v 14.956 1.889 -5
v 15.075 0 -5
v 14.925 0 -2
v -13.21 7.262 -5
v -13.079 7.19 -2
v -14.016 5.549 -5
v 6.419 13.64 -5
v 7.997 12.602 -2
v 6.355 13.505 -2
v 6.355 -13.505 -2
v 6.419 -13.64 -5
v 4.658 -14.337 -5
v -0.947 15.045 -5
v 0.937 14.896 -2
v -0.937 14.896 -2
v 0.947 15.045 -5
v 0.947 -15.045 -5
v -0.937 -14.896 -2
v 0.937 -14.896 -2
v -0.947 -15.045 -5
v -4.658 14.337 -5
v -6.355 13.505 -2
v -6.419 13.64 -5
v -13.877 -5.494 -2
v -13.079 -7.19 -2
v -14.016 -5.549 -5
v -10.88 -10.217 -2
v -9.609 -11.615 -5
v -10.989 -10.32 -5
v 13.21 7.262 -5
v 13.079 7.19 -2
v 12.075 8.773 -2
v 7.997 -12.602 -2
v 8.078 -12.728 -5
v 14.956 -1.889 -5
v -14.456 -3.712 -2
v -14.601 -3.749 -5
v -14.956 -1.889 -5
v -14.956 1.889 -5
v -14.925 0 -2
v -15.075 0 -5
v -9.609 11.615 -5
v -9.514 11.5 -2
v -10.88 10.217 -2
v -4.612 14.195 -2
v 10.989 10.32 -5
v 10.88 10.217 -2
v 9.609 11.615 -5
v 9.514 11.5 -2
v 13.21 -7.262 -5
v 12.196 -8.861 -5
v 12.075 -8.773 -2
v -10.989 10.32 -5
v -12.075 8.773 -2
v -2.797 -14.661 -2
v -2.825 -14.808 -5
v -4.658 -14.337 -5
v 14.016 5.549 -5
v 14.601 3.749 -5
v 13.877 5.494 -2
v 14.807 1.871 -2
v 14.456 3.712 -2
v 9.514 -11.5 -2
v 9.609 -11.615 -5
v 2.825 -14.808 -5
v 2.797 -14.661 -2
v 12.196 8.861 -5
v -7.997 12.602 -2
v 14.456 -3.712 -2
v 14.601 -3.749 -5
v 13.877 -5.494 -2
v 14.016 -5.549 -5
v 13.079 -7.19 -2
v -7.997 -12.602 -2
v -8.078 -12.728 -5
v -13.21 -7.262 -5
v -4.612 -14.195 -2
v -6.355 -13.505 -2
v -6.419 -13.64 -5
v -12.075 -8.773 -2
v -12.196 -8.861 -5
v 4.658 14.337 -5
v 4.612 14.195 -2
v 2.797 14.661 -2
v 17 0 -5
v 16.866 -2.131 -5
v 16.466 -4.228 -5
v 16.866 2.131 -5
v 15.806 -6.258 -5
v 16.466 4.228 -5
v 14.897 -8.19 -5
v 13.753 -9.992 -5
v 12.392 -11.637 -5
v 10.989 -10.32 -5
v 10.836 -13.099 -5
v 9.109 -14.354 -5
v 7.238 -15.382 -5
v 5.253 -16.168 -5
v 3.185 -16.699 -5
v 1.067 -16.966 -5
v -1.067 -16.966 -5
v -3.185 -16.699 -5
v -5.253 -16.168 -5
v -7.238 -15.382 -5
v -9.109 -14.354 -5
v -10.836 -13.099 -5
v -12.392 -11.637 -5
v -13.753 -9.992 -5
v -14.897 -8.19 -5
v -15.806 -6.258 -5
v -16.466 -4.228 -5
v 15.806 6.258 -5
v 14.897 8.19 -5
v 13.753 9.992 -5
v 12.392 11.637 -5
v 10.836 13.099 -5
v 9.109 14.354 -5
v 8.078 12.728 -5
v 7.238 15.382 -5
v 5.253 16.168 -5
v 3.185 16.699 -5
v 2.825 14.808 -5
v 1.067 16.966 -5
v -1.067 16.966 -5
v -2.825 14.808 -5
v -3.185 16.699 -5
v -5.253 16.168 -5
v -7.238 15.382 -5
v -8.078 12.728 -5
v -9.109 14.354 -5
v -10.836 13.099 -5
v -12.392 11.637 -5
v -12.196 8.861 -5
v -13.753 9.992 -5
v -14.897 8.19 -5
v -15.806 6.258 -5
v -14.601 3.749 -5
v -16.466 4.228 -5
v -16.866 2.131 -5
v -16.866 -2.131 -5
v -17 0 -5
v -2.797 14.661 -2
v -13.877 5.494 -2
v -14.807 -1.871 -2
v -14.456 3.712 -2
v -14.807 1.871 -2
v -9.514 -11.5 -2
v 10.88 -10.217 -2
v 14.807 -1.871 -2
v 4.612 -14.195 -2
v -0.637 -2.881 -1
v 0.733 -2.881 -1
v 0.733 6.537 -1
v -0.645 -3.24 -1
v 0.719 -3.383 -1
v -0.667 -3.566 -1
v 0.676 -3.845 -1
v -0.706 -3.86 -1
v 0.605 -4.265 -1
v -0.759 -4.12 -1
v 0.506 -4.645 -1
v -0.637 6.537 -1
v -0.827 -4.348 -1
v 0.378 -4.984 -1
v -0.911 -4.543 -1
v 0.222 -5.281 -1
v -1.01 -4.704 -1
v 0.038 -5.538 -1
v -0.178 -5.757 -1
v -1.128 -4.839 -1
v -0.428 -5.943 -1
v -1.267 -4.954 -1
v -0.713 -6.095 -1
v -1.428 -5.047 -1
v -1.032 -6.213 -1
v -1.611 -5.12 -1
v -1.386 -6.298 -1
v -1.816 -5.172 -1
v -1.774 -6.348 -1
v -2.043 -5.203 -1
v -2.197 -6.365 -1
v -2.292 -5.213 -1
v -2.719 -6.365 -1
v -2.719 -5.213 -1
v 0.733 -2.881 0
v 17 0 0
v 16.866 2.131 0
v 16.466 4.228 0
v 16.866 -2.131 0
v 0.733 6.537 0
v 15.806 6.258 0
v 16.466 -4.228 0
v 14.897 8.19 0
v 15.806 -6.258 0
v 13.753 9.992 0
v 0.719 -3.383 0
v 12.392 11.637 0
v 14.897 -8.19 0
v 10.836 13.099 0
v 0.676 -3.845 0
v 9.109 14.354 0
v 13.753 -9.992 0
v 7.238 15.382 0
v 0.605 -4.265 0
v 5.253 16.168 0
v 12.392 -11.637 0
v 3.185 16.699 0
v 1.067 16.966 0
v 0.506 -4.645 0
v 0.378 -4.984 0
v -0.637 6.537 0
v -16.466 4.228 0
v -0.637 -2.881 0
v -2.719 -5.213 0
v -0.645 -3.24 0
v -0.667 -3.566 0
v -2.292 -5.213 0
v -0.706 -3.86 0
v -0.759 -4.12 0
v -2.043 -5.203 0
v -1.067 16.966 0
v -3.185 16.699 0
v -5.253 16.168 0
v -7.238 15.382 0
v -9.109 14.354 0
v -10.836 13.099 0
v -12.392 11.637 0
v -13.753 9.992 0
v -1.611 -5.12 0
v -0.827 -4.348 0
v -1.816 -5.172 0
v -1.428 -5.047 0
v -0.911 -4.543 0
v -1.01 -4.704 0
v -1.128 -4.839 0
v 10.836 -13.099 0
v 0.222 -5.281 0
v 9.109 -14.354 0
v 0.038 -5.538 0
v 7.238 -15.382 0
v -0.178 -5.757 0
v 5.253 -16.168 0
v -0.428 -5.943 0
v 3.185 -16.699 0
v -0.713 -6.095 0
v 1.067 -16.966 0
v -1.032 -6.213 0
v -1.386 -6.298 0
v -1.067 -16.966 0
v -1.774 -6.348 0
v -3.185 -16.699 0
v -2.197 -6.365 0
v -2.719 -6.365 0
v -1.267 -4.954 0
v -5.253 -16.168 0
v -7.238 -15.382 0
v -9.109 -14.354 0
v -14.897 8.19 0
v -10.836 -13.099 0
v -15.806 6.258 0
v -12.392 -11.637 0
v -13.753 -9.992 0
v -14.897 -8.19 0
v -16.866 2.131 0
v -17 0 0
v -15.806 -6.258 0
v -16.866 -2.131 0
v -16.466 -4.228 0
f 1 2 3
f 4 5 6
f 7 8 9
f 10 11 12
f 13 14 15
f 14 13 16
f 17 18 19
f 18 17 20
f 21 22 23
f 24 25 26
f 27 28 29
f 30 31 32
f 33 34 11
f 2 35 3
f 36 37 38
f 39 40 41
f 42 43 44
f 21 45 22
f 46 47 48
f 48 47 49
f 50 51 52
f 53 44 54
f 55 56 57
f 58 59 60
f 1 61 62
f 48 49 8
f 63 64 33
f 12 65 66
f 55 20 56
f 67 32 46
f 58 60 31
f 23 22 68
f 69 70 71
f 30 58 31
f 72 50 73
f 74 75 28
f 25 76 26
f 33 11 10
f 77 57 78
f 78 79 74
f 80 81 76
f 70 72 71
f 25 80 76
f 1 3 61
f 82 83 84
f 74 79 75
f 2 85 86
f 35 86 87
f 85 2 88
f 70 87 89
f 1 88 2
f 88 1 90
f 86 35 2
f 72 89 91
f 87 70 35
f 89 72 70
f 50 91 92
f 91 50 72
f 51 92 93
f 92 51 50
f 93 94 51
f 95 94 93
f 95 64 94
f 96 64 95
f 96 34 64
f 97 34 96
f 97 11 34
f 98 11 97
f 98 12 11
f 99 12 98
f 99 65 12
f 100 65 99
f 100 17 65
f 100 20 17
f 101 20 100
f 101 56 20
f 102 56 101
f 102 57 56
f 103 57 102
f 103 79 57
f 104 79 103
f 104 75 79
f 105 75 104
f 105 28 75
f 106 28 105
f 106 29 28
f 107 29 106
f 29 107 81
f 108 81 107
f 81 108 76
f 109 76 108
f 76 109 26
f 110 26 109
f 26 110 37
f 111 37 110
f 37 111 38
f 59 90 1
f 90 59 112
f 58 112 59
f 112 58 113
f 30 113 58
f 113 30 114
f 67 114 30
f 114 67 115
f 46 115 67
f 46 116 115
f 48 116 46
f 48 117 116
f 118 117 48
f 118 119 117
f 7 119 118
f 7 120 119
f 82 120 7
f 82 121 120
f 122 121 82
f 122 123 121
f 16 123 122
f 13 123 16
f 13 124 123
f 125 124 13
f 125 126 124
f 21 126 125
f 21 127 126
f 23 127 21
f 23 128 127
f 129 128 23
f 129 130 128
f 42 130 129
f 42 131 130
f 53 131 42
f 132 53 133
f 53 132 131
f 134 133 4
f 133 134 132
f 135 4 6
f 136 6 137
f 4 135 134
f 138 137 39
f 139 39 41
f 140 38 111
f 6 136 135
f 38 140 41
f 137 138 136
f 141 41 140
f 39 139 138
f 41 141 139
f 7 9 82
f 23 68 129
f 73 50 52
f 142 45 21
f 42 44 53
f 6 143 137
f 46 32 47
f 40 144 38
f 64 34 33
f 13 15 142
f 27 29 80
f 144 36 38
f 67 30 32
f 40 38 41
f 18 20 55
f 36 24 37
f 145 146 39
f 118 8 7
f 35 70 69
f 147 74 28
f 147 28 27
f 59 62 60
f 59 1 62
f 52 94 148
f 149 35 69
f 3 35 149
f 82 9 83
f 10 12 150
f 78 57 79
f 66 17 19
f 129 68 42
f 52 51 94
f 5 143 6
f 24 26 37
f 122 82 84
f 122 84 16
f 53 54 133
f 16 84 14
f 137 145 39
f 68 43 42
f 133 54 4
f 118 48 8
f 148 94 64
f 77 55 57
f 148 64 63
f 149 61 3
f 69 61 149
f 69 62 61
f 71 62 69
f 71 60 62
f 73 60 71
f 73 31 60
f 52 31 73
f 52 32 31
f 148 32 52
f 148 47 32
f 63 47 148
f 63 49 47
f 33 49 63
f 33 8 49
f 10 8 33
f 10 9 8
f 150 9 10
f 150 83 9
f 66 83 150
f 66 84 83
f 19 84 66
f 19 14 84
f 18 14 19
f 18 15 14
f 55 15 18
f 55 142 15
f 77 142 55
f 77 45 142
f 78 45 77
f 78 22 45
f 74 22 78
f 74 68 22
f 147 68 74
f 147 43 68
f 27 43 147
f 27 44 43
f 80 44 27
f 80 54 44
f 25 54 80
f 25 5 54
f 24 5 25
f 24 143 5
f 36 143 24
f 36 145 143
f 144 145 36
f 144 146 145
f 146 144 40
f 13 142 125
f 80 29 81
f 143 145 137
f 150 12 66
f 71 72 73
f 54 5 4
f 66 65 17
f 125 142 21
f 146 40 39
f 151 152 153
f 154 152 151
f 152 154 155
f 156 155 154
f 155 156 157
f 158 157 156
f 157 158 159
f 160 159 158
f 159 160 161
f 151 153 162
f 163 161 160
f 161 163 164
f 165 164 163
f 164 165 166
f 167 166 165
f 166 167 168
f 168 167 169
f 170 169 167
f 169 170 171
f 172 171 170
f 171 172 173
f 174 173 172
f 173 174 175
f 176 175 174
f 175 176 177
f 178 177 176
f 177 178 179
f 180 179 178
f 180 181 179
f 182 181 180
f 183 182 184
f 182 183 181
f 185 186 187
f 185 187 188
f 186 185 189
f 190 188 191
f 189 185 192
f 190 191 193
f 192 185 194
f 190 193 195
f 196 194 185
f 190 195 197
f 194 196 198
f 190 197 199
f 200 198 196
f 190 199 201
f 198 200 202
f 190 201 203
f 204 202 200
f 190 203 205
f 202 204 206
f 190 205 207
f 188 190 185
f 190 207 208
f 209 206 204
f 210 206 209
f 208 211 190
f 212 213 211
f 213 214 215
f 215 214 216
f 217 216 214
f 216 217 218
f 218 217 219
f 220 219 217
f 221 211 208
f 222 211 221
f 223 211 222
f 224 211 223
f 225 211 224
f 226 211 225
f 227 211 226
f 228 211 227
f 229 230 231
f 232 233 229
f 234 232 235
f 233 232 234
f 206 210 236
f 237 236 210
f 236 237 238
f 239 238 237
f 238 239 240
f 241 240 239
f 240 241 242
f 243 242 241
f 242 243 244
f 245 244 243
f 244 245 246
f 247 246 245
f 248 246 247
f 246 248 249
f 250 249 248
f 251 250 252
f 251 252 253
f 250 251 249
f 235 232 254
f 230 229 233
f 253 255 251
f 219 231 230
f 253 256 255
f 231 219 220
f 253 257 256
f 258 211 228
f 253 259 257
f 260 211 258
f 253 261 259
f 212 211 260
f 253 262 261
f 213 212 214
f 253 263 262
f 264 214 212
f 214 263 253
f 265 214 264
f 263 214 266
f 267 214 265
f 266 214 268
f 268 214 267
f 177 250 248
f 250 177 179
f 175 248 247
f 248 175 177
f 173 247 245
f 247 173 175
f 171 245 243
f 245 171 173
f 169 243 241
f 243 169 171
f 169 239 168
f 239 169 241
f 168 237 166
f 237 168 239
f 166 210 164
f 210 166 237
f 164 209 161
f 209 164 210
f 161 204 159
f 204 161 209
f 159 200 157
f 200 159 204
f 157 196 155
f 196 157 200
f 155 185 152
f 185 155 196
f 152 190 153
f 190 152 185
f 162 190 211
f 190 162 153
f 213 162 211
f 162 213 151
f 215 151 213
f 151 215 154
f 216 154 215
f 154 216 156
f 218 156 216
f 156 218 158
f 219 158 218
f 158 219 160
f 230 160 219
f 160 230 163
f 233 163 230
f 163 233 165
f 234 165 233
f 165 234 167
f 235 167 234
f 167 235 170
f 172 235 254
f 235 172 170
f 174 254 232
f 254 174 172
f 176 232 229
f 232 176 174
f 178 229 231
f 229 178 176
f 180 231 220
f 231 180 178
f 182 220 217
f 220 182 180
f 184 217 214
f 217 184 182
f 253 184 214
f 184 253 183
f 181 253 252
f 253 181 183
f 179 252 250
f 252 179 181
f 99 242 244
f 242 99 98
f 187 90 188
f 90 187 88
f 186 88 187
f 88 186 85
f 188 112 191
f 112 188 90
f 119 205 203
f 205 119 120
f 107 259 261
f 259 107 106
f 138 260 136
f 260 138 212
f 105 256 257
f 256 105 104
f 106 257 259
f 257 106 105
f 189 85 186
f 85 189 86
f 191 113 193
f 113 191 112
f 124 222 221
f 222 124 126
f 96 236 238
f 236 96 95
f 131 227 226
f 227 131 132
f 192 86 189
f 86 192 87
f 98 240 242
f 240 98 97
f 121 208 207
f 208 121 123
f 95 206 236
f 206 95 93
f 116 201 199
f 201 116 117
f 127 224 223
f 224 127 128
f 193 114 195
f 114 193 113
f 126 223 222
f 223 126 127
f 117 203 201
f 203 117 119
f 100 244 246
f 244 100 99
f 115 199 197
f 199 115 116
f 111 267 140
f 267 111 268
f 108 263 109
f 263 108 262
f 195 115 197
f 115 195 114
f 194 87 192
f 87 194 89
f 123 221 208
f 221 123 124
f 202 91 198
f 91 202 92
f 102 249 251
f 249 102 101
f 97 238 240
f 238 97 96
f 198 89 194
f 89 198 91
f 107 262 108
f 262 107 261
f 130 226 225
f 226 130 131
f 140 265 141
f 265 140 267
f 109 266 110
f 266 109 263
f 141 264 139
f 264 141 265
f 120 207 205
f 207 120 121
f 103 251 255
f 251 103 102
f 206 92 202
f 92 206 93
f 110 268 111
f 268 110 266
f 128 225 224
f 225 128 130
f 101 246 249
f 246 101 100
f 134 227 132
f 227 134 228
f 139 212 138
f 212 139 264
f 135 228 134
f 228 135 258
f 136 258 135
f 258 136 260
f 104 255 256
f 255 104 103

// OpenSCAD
$fn = 50;

difference() {
	union() {
		translate(v = [0, 0, -5.0]) {
			cylinder(h = 5, r = 17.0);
		}
	}
	union() {
		#translate(v = [0, 0, -5.0]) {
			cylinder(h = 3, r1 = 15.075, r2 = 14.925);
		}
		translate(v = [0, 0, -1]) {
			linear_extrude(height = 1) {
				text(font = "Impact", halign = "center", size = 10, text = "J", valign = "center");
			}
		}
	}
}
